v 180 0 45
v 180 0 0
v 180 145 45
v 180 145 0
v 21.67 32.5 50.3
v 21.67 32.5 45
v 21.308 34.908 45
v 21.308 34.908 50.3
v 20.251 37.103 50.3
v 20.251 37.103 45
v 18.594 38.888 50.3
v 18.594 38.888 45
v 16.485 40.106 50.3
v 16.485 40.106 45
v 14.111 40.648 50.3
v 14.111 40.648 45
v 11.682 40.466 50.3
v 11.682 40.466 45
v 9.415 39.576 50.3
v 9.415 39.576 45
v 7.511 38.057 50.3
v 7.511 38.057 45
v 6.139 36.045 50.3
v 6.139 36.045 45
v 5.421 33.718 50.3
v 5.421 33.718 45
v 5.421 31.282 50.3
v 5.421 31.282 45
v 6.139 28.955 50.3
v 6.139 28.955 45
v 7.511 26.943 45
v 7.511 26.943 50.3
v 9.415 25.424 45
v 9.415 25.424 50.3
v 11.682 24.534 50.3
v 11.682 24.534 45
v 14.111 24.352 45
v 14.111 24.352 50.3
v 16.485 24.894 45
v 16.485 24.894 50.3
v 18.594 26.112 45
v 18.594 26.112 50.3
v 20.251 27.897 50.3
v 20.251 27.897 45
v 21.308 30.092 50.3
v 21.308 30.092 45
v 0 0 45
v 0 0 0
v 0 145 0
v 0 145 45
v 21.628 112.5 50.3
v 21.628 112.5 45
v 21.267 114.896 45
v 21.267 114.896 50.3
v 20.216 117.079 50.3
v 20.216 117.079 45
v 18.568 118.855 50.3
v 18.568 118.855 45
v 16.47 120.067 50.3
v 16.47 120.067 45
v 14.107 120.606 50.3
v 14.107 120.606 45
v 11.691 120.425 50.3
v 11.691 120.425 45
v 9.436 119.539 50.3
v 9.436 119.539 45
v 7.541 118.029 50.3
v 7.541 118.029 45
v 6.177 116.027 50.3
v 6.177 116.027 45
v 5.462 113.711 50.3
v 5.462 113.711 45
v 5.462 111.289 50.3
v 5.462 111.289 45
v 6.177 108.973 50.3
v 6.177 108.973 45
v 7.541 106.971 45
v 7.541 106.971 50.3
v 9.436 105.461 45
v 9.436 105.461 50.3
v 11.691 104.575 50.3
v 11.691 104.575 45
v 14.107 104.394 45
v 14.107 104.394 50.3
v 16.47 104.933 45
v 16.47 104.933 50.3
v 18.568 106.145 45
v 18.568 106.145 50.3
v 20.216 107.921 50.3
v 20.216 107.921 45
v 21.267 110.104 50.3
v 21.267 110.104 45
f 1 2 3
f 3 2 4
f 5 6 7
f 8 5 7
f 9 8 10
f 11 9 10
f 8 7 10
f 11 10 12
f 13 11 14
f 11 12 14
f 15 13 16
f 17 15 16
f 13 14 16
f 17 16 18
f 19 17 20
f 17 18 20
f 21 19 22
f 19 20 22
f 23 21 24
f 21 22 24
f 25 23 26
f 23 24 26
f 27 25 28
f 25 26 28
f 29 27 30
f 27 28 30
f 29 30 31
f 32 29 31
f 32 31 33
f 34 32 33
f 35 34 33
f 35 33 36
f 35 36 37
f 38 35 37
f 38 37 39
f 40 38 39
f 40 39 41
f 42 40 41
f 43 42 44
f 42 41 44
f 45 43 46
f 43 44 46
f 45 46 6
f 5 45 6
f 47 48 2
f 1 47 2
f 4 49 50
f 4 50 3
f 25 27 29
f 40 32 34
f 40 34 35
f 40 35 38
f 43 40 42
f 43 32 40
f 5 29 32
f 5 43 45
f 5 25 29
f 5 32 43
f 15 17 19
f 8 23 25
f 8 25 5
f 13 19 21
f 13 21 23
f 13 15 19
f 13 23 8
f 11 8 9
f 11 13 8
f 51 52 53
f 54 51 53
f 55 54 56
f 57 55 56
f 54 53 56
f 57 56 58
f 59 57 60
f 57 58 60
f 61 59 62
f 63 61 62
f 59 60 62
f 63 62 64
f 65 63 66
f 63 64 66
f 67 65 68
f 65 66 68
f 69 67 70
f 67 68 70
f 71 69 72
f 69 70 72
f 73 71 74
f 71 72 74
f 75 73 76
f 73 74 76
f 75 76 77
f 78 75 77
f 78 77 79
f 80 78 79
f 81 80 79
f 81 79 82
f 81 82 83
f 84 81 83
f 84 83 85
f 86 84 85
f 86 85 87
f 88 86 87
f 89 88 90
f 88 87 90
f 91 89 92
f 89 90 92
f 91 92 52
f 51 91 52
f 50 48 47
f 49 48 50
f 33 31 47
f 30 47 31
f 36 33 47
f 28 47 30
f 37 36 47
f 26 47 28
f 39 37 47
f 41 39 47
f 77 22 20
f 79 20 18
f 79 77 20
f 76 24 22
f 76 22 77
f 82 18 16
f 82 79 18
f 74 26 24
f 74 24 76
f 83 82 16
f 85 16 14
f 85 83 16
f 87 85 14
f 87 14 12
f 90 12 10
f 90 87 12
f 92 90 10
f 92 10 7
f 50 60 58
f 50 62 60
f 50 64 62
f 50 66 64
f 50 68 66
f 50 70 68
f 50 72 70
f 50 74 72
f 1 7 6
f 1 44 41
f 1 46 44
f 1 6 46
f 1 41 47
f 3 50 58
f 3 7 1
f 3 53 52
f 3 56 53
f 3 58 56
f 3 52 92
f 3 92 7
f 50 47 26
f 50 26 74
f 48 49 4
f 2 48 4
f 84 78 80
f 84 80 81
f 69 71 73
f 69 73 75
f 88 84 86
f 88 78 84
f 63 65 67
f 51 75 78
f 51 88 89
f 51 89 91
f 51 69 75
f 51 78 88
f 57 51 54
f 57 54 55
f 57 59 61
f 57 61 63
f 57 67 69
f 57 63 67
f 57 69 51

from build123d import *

# Parameters (mm, degrees)
SKETCH_W      = 180
SKETCH_H      = 145
PAD_DEPTH     = 45
SKETCH001_R   = 8.128419
SKETCH001_R_2 = 8.170495
PAD001_DEPTH  = 5.3


with BuildPart() as part:
    # Sketch → Pad (new body)
    with BuildSketch(Plane.XY):
        with Locations((90, 72.5)):
            Rectangle(SKETCH_W, SKETCH_H)
    extrude(amount=PAD_DEPTH)

    # Sketch001 (on Face6 of Pad) → Pad001 (join)
    with BuildSketch(Plane.XY.offset(45)):
        with Locations((13.5, 112.5)):
            Circle(SKETCH001_R)
        with Locations((13.5, 32.5)):
            Circle(SKETCH001_R_2)
    extrude(amount=PAD001_DEPTH)


solid = part.part
